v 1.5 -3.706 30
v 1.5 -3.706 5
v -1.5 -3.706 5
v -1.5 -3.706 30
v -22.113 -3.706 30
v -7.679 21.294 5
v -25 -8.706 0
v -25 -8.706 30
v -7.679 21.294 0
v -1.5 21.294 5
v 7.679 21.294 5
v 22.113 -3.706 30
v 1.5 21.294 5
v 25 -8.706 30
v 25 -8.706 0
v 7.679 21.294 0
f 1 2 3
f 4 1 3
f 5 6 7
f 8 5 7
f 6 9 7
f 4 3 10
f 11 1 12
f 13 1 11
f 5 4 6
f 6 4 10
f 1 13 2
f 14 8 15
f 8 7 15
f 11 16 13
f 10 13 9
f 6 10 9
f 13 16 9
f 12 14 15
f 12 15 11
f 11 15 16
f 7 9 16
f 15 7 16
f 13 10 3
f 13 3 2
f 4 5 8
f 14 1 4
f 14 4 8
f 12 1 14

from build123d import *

# Parameters (mm, degrees)
F1_DEPTH      = 5
F4_DEPTH      = 25
F5_DEPTH      = 23.1132486541
F5_DEPTH_BACK = 23.1132486541


with BuildPart() as f1:
    # F0 (on Top) → F1 (new body)
    with BuildSketch(Plane.XY):
        Polygon((7.6794919243, 21.294143835), (-7.6794919243, 21.294143835), (-25, -8.705856165), (25, -8.705856165), align=None)
    extrude(amount=F1_DEPTH)

    # F2 (on face) → F4 (join, through all)
    with BuildSketch(Plane.XY.offset(5)):
        Polygon((-1.5, -3.705856165), (-1.5, 21.294143835), (-7.6794919243, 21.294143835), (-25, -8.705856165), (25, -8.705856165), (7.6794919243, 21.294143835), (1.5, 21.294143835), (1.5, -3.705856165), align=None)
    extrude(amount=F4_DEPTH)

    # F3 (on Right) → F5 (cut, two sides)
    with BuildSketch(Plane.YZ) as f5_sk:
        Polygon((-3.705856165, 30), (21.294143835, 5), (21.294143835, 30), align=None)
    extrude(amount=-F5_DEPTH, mode=Mode.SUBTRACT)
    extrude(f5_sk.sketch, amount=F5_DEPTH_BACK, mode=Mode.SUBTRACT)


solid = f1.part
